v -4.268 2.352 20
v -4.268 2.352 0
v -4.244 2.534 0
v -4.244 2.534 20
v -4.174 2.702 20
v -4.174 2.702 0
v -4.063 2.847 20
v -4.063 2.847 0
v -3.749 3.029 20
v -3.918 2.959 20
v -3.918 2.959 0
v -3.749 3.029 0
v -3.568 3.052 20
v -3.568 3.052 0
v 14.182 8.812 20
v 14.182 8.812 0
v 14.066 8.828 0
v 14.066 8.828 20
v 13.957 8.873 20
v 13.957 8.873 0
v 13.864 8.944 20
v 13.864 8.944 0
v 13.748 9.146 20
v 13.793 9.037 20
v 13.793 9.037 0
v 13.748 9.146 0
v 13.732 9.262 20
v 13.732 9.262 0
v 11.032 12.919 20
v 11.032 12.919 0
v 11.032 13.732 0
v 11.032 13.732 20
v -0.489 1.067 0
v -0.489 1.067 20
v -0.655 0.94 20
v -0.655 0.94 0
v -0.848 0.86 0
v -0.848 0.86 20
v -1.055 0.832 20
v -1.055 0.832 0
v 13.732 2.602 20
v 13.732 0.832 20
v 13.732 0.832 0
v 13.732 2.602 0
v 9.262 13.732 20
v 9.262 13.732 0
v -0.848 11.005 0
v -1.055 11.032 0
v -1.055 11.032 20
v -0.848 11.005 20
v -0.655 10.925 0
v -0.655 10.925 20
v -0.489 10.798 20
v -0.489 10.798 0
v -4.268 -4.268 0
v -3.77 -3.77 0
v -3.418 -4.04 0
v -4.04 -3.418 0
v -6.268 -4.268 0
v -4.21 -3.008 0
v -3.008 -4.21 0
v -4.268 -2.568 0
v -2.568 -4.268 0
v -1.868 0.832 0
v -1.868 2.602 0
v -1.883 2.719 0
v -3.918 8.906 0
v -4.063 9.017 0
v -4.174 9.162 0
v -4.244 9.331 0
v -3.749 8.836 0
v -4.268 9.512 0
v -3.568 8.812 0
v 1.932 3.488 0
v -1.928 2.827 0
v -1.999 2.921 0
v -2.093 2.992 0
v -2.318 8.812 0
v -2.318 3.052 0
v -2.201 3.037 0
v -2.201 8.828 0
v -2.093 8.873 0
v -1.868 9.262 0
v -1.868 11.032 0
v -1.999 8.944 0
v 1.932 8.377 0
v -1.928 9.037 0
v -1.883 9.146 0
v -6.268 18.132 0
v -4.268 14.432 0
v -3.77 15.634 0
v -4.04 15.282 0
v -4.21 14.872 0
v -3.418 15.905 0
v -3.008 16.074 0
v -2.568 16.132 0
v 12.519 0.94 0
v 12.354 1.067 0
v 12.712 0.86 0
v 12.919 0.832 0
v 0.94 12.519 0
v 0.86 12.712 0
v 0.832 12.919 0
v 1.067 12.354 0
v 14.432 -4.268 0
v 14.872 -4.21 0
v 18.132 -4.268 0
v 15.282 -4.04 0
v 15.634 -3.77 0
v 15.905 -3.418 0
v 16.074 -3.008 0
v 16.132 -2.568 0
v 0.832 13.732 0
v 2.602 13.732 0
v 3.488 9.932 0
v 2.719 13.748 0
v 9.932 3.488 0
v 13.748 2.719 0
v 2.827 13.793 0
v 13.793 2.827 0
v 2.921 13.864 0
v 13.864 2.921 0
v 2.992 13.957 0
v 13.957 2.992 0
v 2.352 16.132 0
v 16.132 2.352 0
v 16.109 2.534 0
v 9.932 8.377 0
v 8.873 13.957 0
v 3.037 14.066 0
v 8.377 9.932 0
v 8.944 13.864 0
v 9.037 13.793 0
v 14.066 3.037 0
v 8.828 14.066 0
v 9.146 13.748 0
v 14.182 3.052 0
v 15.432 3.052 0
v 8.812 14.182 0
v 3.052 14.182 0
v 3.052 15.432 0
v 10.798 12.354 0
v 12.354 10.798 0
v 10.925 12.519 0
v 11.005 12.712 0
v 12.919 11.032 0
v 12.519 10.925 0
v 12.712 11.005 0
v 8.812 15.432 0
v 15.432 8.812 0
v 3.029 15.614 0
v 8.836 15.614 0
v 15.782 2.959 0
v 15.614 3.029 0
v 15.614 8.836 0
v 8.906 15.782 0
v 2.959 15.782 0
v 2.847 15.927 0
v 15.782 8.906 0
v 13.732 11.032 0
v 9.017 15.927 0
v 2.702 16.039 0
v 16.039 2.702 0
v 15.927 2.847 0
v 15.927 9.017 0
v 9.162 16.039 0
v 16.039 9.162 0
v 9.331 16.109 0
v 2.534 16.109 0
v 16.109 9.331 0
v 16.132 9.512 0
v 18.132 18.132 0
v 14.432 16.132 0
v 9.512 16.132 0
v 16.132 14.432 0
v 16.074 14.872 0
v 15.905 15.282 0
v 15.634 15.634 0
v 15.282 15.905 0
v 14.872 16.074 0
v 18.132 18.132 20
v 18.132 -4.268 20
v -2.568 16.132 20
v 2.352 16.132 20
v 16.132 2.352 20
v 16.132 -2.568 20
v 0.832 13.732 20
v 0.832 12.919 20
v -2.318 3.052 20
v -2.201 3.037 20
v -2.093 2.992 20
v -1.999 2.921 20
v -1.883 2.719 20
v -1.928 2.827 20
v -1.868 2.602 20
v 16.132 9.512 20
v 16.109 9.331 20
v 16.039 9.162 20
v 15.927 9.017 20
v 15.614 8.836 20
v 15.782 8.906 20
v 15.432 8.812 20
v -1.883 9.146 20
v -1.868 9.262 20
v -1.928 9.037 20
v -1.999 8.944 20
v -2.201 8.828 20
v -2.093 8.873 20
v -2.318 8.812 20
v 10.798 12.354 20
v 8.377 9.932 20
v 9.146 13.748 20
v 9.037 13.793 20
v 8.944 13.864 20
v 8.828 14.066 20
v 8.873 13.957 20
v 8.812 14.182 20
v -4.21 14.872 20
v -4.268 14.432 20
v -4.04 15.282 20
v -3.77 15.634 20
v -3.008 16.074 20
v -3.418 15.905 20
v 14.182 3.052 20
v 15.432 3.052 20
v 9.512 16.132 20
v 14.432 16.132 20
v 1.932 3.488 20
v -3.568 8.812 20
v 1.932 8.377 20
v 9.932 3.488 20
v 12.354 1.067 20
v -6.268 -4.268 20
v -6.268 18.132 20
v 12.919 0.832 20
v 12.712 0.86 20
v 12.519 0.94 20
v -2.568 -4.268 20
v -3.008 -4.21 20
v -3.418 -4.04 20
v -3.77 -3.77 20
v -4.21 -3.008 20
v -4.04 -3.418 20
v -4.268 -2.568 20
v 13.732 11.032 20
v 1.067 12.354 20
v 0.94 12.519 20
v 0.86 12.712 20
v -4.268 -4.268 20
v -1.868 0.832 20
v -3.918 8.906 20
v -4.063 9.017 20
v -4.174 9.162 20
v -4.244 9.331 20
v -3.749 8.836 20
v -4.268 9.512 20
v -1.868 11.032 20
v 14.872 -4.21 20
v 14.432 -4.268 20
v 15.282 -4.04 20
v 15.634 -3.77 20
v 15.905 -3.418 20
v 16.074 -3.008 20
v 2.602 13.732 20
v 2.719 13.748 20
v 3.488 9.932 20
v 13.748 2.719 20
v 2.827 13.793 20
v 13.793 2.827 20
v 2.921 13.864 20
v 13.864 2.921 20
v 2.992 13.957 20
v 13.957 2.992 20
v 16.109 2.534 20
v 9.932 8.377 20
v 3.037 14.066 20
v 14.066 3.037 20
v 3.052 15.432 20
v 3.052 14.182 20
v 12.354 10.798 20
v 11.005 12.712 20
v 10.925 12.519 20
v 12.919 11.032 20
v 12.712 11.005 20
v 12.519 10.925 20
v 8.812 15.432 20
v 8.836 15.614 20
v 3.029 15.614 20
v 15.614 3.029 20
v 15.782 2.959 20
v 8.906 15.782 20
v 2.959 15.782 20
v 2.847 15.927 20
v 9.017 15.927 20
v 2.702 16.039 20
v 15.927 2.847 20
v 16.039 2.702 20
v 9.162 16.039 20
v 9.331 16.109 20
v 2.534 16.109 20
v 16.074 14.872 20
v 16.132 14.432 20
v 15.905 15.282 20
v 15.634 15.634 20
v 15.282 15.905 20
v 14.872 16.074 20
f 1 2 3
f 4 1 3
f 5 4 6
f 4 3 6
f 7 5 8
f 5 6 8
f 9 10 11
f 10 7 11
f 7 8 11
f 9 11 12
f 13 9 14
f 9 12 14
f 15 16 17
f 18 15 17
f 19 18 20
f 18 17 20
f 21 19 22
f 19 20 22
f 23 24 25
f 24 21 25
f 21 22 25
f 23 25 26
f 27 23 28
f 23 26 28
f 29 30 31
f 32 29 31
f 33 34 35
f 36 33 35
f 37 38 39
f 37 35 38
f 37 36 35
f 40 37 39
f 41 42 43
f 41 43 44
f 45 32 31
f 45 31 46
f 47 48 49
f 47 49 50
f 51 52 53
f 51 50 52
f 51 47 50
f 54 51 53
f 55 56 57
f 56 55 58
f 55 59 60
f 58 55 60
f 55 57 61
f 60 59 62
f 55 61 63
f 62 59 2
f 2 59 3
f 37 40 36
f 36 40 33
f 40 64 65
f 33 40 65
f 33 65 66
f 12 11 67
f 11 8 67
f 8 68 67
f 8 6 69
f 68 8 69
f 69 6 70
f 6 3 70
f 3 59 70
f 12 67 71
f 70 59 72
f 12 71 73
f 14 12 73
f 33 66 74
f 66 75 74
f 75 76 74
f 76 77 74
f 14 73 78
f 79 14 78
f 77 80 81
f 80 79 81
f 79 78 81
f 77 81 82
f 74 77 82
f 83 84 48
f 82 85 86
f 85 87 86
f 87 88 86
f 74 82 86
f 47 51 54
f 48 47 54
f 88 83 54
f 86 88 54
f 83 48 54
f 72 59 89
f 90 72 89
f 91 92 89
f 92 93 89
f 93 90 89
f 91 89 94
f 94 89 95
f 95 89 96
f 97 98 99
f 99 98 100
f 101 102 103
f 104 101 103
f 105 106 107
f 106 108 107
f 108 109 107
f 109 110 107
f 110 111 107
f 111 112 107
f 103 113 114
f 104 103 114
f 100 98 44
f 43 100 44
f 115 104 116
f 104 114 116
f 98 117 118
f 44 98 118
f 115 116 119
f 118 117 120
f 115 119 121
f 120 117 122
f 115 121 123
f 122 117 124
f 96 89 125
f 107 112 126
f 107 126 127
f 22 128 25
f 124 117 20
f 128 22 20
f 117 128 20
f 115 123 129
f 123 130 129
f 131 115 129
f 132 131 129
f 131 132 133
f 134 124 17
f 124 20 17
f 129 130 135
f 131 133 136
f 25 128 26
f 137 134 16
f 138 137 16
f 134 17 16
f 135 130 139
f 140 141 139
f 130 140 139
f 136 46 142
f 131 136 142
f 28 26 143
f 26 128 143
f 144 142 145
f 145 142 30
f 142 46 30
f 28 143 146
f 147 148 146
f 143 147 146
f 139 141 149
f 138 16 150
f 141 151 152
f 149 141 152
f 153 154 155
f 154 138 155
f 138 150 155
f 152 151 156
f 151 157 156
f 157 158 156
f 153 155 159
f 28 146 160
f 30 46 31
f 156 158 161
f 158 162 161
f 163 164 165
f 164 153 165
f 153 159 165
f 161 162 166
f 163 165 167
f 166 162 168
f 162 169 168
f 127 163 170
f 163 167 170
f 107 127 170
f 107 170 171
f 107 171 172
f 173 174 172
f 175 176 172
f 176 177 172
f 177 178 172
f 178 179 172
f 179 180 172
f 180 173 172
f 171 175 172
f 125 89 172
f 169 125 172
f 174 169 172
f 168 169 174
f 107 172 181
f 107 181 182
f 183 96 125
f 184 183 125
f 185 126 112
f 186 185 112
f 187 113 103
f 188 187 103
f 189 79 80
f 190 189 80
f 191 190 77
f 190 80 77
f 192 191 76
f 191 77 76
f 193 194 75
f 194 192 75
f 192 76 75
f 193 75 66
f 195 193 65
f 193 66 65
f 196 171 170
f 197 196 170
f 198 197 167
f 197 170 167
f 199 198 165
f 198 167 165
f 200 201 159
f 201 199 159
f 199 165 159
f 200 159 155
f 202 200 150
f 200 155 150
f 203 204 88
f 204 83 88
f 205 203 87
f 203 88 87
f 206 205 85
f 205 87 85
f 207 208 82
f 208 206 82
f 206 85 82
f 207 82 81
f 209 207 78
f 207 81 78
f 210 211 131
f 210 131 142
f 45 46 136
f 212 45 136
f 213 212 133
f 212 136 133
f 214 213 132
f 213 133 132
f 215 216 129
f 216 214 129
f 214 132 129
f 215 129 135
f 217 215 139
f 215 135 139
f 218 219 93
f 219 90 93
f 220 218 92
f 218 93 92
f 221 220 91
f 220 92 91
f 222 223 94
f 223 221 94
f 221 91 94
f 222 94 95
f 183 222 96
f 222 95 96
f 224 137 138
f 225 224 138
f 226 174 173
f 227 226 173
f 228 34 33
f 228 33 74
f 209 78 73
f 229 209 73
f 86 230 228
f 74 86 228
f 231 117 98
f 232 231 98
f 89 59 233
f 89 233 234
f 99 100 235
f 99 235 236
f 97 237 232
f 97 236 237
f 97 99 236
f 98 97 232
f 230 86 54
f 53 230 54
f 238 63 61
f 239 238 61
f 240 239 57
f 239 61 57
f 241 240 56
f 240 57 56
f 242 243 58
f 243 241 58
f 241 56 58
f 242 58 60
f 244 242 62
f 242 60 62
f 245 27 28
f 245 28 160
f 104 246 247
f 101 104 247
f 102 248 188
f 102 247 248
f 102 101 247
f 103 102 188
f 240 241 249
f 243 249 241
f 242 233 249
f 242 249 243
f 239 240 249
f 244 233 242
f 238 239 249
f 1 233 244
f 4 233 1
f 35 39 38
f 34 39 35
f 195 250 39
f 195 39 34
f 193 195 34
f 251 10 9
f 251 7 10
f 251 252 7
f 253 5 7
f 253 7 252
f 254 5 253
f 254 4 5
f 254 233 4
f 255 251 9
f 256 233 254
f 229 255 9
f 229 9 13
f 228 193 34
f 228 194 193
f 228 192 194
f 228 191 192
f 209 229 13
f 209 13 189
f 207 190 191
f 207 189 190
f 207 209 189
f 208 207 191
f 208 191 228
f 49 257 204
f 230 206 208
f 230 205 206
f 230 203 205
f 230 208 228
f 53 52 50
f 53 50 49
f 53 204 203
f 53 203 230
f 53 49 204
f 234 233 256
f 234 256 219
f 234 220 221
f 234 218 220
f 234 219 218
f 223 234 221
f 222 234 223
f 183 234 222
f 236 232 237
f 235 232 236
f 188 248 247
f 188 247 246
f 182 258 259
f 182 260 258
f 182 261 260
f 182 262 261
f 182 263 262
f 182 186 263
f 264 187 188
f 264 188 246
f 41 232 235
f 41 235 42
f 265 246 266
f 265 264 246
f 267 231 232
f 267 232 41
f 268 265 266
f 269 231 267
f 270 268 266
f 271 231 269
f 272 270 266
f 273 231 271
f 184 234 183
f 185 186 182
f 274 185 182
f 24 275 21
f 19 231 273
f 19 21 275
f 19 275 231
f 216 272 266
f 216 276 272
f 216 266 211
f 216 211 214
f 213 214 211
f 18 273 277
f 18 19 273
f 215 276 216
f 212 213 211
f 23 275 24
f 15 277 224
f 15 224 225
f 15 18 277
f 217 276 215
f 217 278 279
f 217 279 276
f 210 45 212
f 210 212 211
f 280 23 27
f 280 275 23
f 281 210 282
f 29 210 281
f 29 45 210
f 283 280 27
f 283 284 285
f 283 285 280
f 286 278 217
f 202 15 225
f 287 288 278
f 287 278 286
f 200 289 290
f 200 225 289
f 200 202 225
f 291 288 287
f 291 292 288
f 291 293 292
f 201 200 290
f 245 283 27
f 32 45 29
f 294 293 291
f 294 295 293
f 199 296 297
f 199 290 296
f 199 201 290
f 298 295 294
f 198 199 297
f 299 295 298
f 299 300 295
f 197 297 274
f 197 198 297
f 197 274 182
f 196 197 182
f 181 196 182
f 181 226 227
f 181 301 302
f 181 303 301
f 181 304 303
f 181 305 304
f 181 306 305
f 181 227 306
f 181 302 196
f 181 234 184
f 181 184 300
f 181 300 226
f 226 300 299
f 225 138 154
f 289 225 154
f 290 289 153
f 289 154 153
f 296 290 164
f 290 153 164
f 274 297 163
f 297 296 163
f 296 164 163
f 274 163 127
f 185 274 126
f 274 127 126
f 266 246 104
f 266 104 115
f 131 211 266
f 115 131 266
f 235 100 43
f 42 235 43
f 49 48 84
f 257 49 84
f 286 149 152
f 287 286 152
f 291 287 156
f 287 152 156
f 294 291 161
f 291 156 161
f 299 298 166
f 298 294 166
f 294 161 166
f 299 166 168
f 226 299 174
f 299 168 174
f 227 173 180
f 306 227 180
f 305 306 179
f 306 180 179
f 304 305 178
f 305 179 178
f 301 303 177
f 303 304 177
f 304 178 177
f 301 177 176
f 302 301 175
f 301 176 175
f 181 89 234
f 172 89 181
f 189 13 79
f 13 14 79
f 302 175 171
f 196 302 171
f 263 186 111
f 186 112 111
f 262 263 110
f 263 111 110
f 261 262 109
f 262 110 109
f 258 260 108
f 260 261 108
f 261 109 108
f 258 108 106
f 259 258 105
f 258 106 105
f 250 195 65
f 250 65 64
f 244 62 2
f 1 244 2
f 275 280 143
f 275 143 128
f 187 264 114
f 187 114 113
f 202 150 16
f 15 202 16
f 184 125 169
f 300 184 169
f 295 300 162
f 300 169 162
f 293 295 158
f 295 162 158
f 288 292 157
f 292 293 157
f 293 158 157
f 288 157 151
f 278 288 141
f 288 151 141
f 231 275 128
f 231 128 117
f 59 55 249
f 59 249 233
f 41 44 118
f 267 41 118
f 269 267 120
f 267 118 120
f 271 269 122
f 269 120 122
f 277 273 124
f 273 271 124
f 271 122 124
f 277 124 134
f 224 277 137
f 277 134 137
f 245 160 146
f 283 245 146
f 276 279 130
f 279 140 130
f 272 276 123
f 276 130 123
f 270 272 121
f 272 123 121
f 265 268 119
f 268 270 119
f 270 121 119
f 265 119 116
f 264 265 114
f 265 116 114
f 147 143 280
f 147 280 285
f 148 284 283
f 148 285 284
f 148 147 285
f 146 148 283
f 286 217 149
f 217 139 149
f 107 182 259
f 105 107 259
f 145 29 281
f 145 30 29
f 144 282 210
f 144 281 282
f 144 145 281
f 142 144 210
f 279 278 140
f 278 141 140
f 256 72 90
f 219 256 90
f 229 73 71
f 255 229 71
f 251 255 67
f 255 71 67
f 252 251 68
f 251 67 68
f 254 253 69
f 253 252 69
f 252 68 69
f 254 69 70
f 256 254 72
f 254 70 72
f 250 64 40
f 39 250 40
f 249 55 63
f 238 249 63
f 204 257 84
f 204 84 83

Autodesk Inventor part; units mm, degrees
ref_plane "YZ Plane" through (0, 0, 0) normal (1, 0, 0) x (0, 1, 0)
ref_plane "XZ Plane" through (0, 0, 0) normal (0, 1, 0) x (-1, 0, 0)
ref_plane "XY Plane" through (0, 0, 0) normal (0, 0, 1) x (1, 0, 0)
sketch "Sketch1" plane through (0, 0, 0) normal (0, 0, 1) x (1, 0, 0)
  arc A0 (-1.0546, 0.6324) -> (-0.3475, 0.9253) centre (-1.0546, 1.6324) ccw projected
  line L0 (-1.0546, 0.6324) -> (-1.8676, 0.6324) projected
  arc A1 (-2.0676, 0.8324) -> (-1.8676, 0.6324) centre (-1.8676, 0.8324) ccw projected
  line L1 (-2.0676, 0.8324) -> (-2.0676, 2.6024) projected
  arc A2 (-2.0676, 2.6024) -> (-2.3176, 2.8524) centre (-2.3176, 2.6024) ccw projected
  line L2 (-2.3176, 2.8524) -> (-3.5676, 2.8524) projected
  arc A3 (-3.5676, 2.8524) -> (-4.0676, 2.3524) centre (-3.5676, 2.3524) ccw projected
  line L3 (-4.0676, 2.3524) -> (-4.0676, -2.5676) projected
  arc A4 (-4.0676, -2.5676) -> (-2.5676, -4.0676) centre (-2.5676, -2.5676) ccw projected
  line L4 (-2.5676, -4.0676) -> (2.3524, -4.0676) projected
  arc A5 (2.3524, -4.0676) -> (2.8524, -3.5676) centre (2.3524, -3.5676) ccw projected
  line L5 (2.8524, -3.5676) -> (2.8524, -2.3176) projected
  arc A6 (2.8524, -2.3176) -> (2.6024, -2.0676) centre (2.6024, -2.3176) ccw projected
  line L6 (2.6024, -2.0676) -> (0.8324, -2.0676) projected
  arc A7 (0.6324, -1.8676) -> (0.8324, -2.0676) centre (0.8324, -1.8676) ccw projected
  line L7 (0.6324, -1.8676) -> (0.6324, -1.0546) projected
  arc A8 (0.9253, -0.3475) -> (0.6324, -1.0546) centre (1.6324, -1.0546) ccw projected
  line L8 (0.9253, -0.3475) -> (4.0676, 2.7948) projected
  arc A9 (4.0676, 2.7948) -> (5.6798, 2.2912) centre (5.9324, 5.9324) ccw projected
  line L9 (5.6798, 2.2912) -> (5.9324, 2.491) projected
  line L10 (5.9324, 2.491) -> (6.1851, 2.2912) projected
  arc A10 (6.1851, 2.2912) -> (7.7973, 2.7948) centre (5.9324, 5.9324) ccw projected
  line L11 (7.7973, 2.7948) -> (10.9395, -0.3475) projected
  arc A11 (11.2324, -1.0546) -> (10.9395, -0.3475) centre (10.2324, -1.0546) ccw projected
  line L12 (11.2324, -1.0546) -> (11.2324, -1.8676) projected
  arc A12 (11.0324, -2.0676) -> (11.2324, -1.8676) centre (11.0324, -1.8676) ccw projected
  line L13 (11.0324, -2.0676) -> (9.2624, -2.0676) projected
  arc A13 (9.2624, -2.0676) -> (9.0124, -2.3176) centre (9.2624, -2.3176) ccw projected
  line L14 (9.0124, -2.3176) -> (9.0124, -3.5676) projected
  arc A14 (9.0124, -3.5676) -> (9.5124, -4.0676) centre (9.5124, -3.5676) ccw projected
  line L15 (9.5124, -4.0676) -> (14.4324, -4.0676) projected
  arc A15 (14.4324, -4.0676) -> (15.9324, -2.5676) centre (14.4324, -2.5676) ccw projected
  line L16 (15.9324, -2.5676) -> (15.9324, 2.3524) projected
  arc A16 (15.9324, 2.3524) -> (15.4324, 2.8524) centre (15.4324, 2.3524) ccw projected
  line L17 (15.4324, 2.8524) -> (14.1824, 2.8524) projected
  arc A17 (14.1824, 2.8524) -> (13.9324, 2.6024) centre (14.1824, 2.6024) ccw projected
  line L18 (13.9324, 2.6024) -> (13.9324, 0.8324) projected
  arc A18 (13.7324, 0.6324) -> (13.9324, 0.8324) centre (13.7324, 0.8324) ccw projected
  line L19 (13.7324, 0.6324) -> (12.9194, 0.6324) projected
  arc A19 (12.2123, 0.9253) -> (12.9194, 0.6324) centre (12.9194, 1.6324) ccw projected
  line L20 (12.2123, 0.9253) -> (9.0701, 4.0676) projected
  arc A20 (9.0701, 4.0676) -> (9.5737, 5.6798) centre (5.9324, 5.9324) ccw projected
  line L21 (9.5737, 5.6798) -> (9.3739, 5.9324) projected
  line L22 (9.3739, 5.9324) -> (9.5739, 6.1824) projected
  arc A21 (9.5739, 6.1824) -> (9.0701, 7.7973) centre (5.9324, 5.9324) ccw projected
  line L23 (9.0701, 7.7973) -> (12.2123, 10.9395) projected
  arc A22 (12.9194, 11.2324) -> (12.2123, 10.9395) centre (12.9194, 10.2324) ccw projected
  line L24 (12.9194, 11.2324) -> (13.7324, 11.2324) projected
  arc A23 (13.9324, 11.0324) -> (13.7324, 11.2324) centre (13.7324, 11.0324) ccw projected
  line L25 (13.9324, 11.0324) -> (13.9324, 9.2624) projected
  arc A24 (13.9324, 9.2624) -> (14.1824, 9.0124) centre (14.1824, 9.2624) ccw projected
  line L26 (14.1824, 9.0124) -> (15.4324, 9.0124) projected
  arc A25 (15.4324, 9.0124) -> (15.9324, 9.5124) centre (15.4324, 9.5124) ccw projected
  line L27 (15.9324, 9.5124) -> (15.9324, 14.4324) projected
  arc A26 (15.9324, 14.4324) -> (14.4324, 15.9324) centre (14.4324, 14.4324) ccw projected
  line L28 (14.4324, 15.9324) -> (9.5124, 15.9324) projected
  arc A27 (9.5124, 15.9324) -> (9.0124, 15.4324) centre (9.5124, 15.4324) ccw projected
  line L29 (9.0124, 15.4324) -> (9.0124, 14.1824) projected
  arc A28 (9.0124, 14.1824) -> (9.2624, 13.9324) centre (9.2624, 14.1824) ccw projected
  line L30 (9.2624, 13.9324) -> (11.0324, 13.9324) projected
  arc A29 (11.2324, 13.7324) -> (11.0324, 13.9324) centre (11.0324, 13.7324) ccw projected
  line L31 (11.2324, 13.7324) -> (11.2324, 12.9194) projected
  arc A30 (10.9395, 12.2123) -> (11.2324, 12.9194) centre (10.2324, 12.9194) ccw projected
  line L32 (10.9395, 12.2123) -> (7.7973, 9.0701) projected
  arc A31 (7.7973, 9.0701) -> (6.1824, 9.5739) centre (5.9324, 5.9324) ccw projected
  line L33 (6.1824, 9.5739) -> (5.9324, 9.3739) projected
  line L34 (5.9324, 9.3739) -> (5.6824, 9.5739) projected
  arc A32 (5.6824, 9.5739) -> (4.0676, 9.0701) centre (5.9324, 5.9324) ccw projected
  line L35 (4.0676, 9.0701) -> (0.9253, 12.2123) projected
  arc A33 (0.6324, 12.9194) -> (0.9253, 12.2123) centre (1.6324, 12.9194) ccw projected
  line L36 (0.6324, 12.9194) -> (0.6324, 13.7324) projected
  arc A34 (0.8324, 13.9324) -> (0.6324, 13.7324) centre (0.8324, 13.7324) ccw projected
  line L37 (0.8324, 13.9324) -> (2.6024, 13.9324) projected
  arc A35 (2.6024, 13.9324) -> (2.8524, 14.1824) centre (2.6024, 14.1824) ccw projected
  line L38 (2.8524, 14.1824) -> (2.8524, 15.4324) projected
  arc A36 (2.8524, 15.4324) -> (2.3524, 15.9324) centre (2.3524, 15.4324) ccw projected
  line L39 (2.3524, 15.9324) -> (-2.5676, 15.9324) projected
  arc A37 (-2.5676, 15.9324) -> (-4.0676, 14.4324) centre (-2.5676, 14.4324) ccw projected
  line L40 (-4.0676, 14.4324) -> (-4.0676, 9.5124) projected
  arc A38 (-4.0676, 9.5124) -> (-3.5676, 9.0124) centre (-3.5676, 9.5124) ccw projected
  line L41 (-3.5676, 9.0124) -> (-2.3176, 9.0124) projected
  arc A39 (-2.3176, 9.0124) -> (-2.0676, 9.2624) centre (-2.3176, 9.2624) ccw projected
  line L42 (-2.0676, 9.2624) -> (-2.0676, 11.0324) projected
  arc A40 (-1.8676, 11.2324) -> (-2.0676, 11.0324) centre (-1.8676, 11.0324) ccw projected
  line L43 (-1.8676, 11.2324) -> (-1.0546, 11.2324) projected
  arc A41 (-0.3475, 10.9395) -> (-1.0546, 11.2324) centre (-1.0546, 10.2324) ccw projected
  line L44 (-0.3475, 10.9395) -> (2.7948, 7.7973) projected
  arc A42 (2.7948, 7.7973) -> (2.291, 6.1824) centre (5.9324, 5.9324) ccw projected
  line L45 (2.291, 6.1824) -> (2.491, 5.9324) projected
  line L46 (2.491, 5.9324) -> (2.2912, 5.6798) projected
  arc A43 (2.2912, 5.6798) -> (2.7948, 4.0676) centre (5.9324, 5.9324) ccw projected
  line L47 (2.7948, 4.0676) -> (-0.3475, 0.9253) projected
  circle A44 centre (5.9324, 5.9324) radius 2.5 projected
  line L48 (-1.0546, 11.0324) -> (-1.8676, 11.0324)
  line L49 (-1.8676, 11.0324) -> (-1.8676, 9.2624)
  arc A45 (-2.3176, 8.8124) -> (-1.8676, 9.2624) centre (-2.3176, 9.2624) ccw
  line L50 (-2.3176, 8.8124) -> (-3.5676, 8.8124)
  arc A46 (-4.2676, 9.5124) -> (-3.5676, 8.8124) centre (-3.5676, 9.5124) ccw
  line L51 (-4.2676, 9.5124) -> (-4.2676, 14.4324)
  arc A47 (-2.5676, 16.1324) -> (-4.2676, 14.4324) centre (-2.5676, 14.4324) ccw
  line L52 (-2.5676, 16.1324) -> (2.3524, 16.1324)
  arc A48 (3.0524, 15.4324) -> (2.3524, 16.1324) centre (2.3524, 15.4324) ccw
  line L53 (3.0524, 15.4324) -> (3.0524, 14.1824)
  arc A49 (2.6024, 13.7324) -> (3.0524, 14.1824) centre (2.6024, 14.1824) ccw
  line L54 (2.6024, 13.7324) -> (0.8324, 13.7324)
  line L55 (0.8324, 13.7324) -> (0.8324, 12.9194)
  arc A50 (0.8324, 12.9194) -> (1.0667, 12.3537) centre (1.6324, 12.9194) ccw
  line L56 (1.0667, 12.3537) -> (4.1014, 9.3191)
  arc A51 (5.7474, 9.778) -> (4.1014, 9.3191) centre (5.9324, 5.9324) ccw
  line L57 (5.7474, 9.778) -> (5.9324, 9.63)
  line L58 (5.9324, 9.63) -> (6.1174, 9.778)
  arc A52 (7.7635, 9.3191) -> (6.1174, 9.778) centre (5.9324, 5.9324) ccw
  line L59 (7.7635, 9.3191) -> (10.7981, 12.3537)
  arc A53 (10.7981, 12.3537) -> (11.0324, 12.9194) centre (10.2324, 12.9194) ccw
  line L60 (11.0324, 12.9194) -> (11.0324, 13.7324)
  line L61 (11.0324, 13.7324) -> (9.2624, 13.7324)
  arc A54 (8.8124, 14.1824) -> (9.2624, 13.7324) centre (9.2624, 14.1824) ccw
  line L62 (8.8124, 14.1824) -> (8.8124, 15.4324)
  arc A55 (9.5124, 16.1324) -> (8.8124, 15.4324) centre (9.5124, 15.4324) ccw
  line L63 (9.5124, 16.1324) -> (14.4324, 16.1324)
  arc A56 (16.1324, 14.4324) -> (14.4324, 16.1324) centre (14.4324, 14.4324) ccw
  line L64 (16.1324, 14.4324) -> (16.1324, 9.5124)
  arc A57 (15.4324, 8.8124) -> (16.1324, 9.5124) centre (15.4324, 9.5124) ccw
  line L65 (15.4324, 8.8124) -> (14.1824, 8.8124)
  arc A58 (13.7324, 9.2624) -> (14.1824, 8.8124) centre (14.1824, 9.2624) ccw
  line L66 (13.7324, 9.2624) -> (13.7324, 11.0324)
  line L67 (13.7324, 11.0324) -> (12.9194, 11.0324)
  arc A59 (12.9194, 11.0324) -> (12.3537, 10.7981) centre (12.9194, 10.2324) ccw
  line L68 (12.3537, 10.7981) -> (9.3191, 7.7635)
  arc A60 (9.778, 6.1174) -> (9.3191, 7.7635) centre (5.9324, 5.9324) ccw
  line L69 (9.778, 6.1174) -> (9.6294, 5.9317)
  line L70 (9.6294, 5.9317) -> (9.7778, 5.7441)
  arc A61 (9.3191, 4.1014) -> (9.7778, 5.7441) centre (5.9324, 5.9324) ccw
  line L71 (9.3191, 4.1014) -> (12.3537, 1.0667)
  arc A62 (12.3537, 1.0667) -> (12.9194, 0.8324) centre (12.9194, 1.6324) ccw
  line L72 (12.9194, 0.8324) -> (13.7324, 0.8324)
  line L73 (13.7324, 0.8324) -> (13.7324, 2.6024)
  arc A63 (14.1824, 3.0524) -> (13.7324, 2.6024) centre (14.1824, 2.6024) ccw
  line L74 (14.1824, 3.0524) -> (15.4324, 3.0524)
  arc A64 (16.1324, 2.3524) -> (15.4324, 3.0524) centre (15.4324, 2.3524) ccw
  line L75 (16.1324, 2.3524) -> (16.1324, -2.5676)
  arc A65 (14.4324, -4.2676) -> (16.1324, -2.5676) centre (14.4324, -2.5676) ccw
  line L76 (14.4324, -4.2676) -> (9.5124, -4.2676)
  arc A66 (8.8124, -3.5676) -> (9.5124, -4.2676) centre (9.5124, -3.5676) ccw
  line L77 (8.8124, -3.5676) -> (8.8124, -2.3176)
  arc A67 (9.2624, -1.8676) -> (8.8124, -2.3176) centre (9.2624, -2.3176) ccw
  line L78 (9.2624, -1.8676) -> (11.0324, -1.8676)
  line L79 (11.0324, -1.8676) -> (11.0324, -1.0546)
  arc A68 (11.0324, -1.0546) -> (10.7981, -0.4889) centre (10.2324, -1.0546) ccw
  line L80 (10.7981, -0.4889) -> (7.7635, 2.5457)
  arc A69 (6.1208, 2.087) -> (7.7635, 2.5457) centre (5.9324, 5.9324) ccw
  line L81 (6.1208, 2.087) -> (5.9324, 2.236)
  line L82 (5.9324, 2.236) -> (5.7441, 2.087)
  arc A70 (4.1014, 2.5457) -> (5.7441, 2.087) centre (5.9324, 5.9324) ccw
  line L83 (4.1014, 2.5457) -> (1.0667, -0.4889)
  arc A71 (1.0667, -0.4889) -> (0.8324, -1.0546) centre (1.6324, -1.0546) ccw
  line L84 (0.8324, -1.0546) -> (0.8324, -1.8676)
  line L85 (0.8324, -1.8676) -> (2.6024, -1.8676)
  arc A72 (3.0524, -2.3176) -> (2.6024, -1.8676) centre (2.6024, -2.3176) ccw
  line L86 (3.0524, -2.3176) -> (3.0524, -3.5676)
  arc A73 (2.3524, -4.2676) -> (3.0524, -3.5676) centre (2.3524, -3.5676) ccw
  line L87 (2.3524, -4.2676) -> (-2.5676, -4.2676)
  arc A74 (-4.2676, -2.5676) -> (-2.5676, -4.2676) centre (-2.5676, -2.5676) ccw
  line L88 (-4.2676, -2.5676) -> (-4.2676, 2.3524)
  arc A75 (-3.5676, 3.0524) -> (-4.2676, 2.3524) centre (-3.5676, 2.3524) ccw
  line L89 (-3.5676, 3.0524) -> (-2.3176, 3.0524)
  arc A76 (-1.8676, 2.6024) -> (-2.3176, 3.0524) centre (-2.3176, 2.6024) ccw
  line L90 (-1.8676, 2.6024) -> (-1.8676, 0.8324)
  line L91 (-1.8676, 0.8324) -> (-1.0546, 0.8324)
  arc A77 (-1.0546, 0.8324) -> (-0.4889, 1.0667) centre (-1.0546, 1.6324) ccw
  line L92 (-0.4889, 1.0667) -> (2.5457, 4.1014)
  arc A78 (2.087, 5.7441) -> (2.5457, 4.1014) centre (5.9324, 5.9324) ccw
  line L93 (2.087, 5.7441) -> (2.2354, 5.9317)
  line L94 (2.2354, 5.9317) -> (2.0869, 6.1174)
  arc A79 (2.5457, 7.7635) -> (2.0869, 6.1174) centre (5.9324, 5.9324) ccw
  line L95 (2.5457, 7.7635) -> (-0.4889, 10.7981)
  arc A80 (-0.4889, 10.7981) -> (-1.0546, 11.0324) centre (-1.0546, 10.2324) ccw
  line L96 (-4.2676, -4.2676) -> (-6.2676, -4.2676)
  line L97 (-6.2676, -4.2676) -> (-6.2676, 18.1324)
  line L98 (-6.2676, 18.1324) -> (18.1324, 18.1324)
  line L99 (18.1324, 18.1324) -> (18.1324, -4.2676)
  line L100 (18.1324, -4.2676) -> (14.4324, -4.2676)
  line L101 (-4.2676, -4.2676) -> (-2.5676, -4.2676)
  line L102 (5.9324, 5.9324) -> (1.9324, 5.9324) construction
  line L103 (1.9324, 8.3768) -> (1.9324, 3.4881)
  line L104 (9.9324, 8.3768) -> (9.9324, 3.4881)
  line L105 (8.3768, 9.9324) -> (3.4881, 9.9324)
  line L106 (5.9324, 5.9324) -> (5.9324, 9.9324) construction
  point P0 (0, 0)
  dimension "d0" = 0.2
  dimension "d1" = 2
  dimension "d2" = 22.4
  dimension "d3" = 24.4
  dimension "d4" = 4
  dimension "d5" = 4
extrude "Extrusion1" add sketch "Sketch1" along normal blind 20 contours A80 L95 L103 L92 A77 L91 L90 A76 L89 A75 L88 A74 L101 L96 L97 L98 L99 L100 A65 L75 A64 L74 A63 L73 L72 A62 L71 L104 L68 A59 L67 L66 A58 L65 A57 L64 A56 L63 A55 L62 A54 L61 L60 A53 L59 L105 L56 A50 L55 L54 A49 L53 A48 L52 A47 L51 A46 L50 A45 L49 L48
